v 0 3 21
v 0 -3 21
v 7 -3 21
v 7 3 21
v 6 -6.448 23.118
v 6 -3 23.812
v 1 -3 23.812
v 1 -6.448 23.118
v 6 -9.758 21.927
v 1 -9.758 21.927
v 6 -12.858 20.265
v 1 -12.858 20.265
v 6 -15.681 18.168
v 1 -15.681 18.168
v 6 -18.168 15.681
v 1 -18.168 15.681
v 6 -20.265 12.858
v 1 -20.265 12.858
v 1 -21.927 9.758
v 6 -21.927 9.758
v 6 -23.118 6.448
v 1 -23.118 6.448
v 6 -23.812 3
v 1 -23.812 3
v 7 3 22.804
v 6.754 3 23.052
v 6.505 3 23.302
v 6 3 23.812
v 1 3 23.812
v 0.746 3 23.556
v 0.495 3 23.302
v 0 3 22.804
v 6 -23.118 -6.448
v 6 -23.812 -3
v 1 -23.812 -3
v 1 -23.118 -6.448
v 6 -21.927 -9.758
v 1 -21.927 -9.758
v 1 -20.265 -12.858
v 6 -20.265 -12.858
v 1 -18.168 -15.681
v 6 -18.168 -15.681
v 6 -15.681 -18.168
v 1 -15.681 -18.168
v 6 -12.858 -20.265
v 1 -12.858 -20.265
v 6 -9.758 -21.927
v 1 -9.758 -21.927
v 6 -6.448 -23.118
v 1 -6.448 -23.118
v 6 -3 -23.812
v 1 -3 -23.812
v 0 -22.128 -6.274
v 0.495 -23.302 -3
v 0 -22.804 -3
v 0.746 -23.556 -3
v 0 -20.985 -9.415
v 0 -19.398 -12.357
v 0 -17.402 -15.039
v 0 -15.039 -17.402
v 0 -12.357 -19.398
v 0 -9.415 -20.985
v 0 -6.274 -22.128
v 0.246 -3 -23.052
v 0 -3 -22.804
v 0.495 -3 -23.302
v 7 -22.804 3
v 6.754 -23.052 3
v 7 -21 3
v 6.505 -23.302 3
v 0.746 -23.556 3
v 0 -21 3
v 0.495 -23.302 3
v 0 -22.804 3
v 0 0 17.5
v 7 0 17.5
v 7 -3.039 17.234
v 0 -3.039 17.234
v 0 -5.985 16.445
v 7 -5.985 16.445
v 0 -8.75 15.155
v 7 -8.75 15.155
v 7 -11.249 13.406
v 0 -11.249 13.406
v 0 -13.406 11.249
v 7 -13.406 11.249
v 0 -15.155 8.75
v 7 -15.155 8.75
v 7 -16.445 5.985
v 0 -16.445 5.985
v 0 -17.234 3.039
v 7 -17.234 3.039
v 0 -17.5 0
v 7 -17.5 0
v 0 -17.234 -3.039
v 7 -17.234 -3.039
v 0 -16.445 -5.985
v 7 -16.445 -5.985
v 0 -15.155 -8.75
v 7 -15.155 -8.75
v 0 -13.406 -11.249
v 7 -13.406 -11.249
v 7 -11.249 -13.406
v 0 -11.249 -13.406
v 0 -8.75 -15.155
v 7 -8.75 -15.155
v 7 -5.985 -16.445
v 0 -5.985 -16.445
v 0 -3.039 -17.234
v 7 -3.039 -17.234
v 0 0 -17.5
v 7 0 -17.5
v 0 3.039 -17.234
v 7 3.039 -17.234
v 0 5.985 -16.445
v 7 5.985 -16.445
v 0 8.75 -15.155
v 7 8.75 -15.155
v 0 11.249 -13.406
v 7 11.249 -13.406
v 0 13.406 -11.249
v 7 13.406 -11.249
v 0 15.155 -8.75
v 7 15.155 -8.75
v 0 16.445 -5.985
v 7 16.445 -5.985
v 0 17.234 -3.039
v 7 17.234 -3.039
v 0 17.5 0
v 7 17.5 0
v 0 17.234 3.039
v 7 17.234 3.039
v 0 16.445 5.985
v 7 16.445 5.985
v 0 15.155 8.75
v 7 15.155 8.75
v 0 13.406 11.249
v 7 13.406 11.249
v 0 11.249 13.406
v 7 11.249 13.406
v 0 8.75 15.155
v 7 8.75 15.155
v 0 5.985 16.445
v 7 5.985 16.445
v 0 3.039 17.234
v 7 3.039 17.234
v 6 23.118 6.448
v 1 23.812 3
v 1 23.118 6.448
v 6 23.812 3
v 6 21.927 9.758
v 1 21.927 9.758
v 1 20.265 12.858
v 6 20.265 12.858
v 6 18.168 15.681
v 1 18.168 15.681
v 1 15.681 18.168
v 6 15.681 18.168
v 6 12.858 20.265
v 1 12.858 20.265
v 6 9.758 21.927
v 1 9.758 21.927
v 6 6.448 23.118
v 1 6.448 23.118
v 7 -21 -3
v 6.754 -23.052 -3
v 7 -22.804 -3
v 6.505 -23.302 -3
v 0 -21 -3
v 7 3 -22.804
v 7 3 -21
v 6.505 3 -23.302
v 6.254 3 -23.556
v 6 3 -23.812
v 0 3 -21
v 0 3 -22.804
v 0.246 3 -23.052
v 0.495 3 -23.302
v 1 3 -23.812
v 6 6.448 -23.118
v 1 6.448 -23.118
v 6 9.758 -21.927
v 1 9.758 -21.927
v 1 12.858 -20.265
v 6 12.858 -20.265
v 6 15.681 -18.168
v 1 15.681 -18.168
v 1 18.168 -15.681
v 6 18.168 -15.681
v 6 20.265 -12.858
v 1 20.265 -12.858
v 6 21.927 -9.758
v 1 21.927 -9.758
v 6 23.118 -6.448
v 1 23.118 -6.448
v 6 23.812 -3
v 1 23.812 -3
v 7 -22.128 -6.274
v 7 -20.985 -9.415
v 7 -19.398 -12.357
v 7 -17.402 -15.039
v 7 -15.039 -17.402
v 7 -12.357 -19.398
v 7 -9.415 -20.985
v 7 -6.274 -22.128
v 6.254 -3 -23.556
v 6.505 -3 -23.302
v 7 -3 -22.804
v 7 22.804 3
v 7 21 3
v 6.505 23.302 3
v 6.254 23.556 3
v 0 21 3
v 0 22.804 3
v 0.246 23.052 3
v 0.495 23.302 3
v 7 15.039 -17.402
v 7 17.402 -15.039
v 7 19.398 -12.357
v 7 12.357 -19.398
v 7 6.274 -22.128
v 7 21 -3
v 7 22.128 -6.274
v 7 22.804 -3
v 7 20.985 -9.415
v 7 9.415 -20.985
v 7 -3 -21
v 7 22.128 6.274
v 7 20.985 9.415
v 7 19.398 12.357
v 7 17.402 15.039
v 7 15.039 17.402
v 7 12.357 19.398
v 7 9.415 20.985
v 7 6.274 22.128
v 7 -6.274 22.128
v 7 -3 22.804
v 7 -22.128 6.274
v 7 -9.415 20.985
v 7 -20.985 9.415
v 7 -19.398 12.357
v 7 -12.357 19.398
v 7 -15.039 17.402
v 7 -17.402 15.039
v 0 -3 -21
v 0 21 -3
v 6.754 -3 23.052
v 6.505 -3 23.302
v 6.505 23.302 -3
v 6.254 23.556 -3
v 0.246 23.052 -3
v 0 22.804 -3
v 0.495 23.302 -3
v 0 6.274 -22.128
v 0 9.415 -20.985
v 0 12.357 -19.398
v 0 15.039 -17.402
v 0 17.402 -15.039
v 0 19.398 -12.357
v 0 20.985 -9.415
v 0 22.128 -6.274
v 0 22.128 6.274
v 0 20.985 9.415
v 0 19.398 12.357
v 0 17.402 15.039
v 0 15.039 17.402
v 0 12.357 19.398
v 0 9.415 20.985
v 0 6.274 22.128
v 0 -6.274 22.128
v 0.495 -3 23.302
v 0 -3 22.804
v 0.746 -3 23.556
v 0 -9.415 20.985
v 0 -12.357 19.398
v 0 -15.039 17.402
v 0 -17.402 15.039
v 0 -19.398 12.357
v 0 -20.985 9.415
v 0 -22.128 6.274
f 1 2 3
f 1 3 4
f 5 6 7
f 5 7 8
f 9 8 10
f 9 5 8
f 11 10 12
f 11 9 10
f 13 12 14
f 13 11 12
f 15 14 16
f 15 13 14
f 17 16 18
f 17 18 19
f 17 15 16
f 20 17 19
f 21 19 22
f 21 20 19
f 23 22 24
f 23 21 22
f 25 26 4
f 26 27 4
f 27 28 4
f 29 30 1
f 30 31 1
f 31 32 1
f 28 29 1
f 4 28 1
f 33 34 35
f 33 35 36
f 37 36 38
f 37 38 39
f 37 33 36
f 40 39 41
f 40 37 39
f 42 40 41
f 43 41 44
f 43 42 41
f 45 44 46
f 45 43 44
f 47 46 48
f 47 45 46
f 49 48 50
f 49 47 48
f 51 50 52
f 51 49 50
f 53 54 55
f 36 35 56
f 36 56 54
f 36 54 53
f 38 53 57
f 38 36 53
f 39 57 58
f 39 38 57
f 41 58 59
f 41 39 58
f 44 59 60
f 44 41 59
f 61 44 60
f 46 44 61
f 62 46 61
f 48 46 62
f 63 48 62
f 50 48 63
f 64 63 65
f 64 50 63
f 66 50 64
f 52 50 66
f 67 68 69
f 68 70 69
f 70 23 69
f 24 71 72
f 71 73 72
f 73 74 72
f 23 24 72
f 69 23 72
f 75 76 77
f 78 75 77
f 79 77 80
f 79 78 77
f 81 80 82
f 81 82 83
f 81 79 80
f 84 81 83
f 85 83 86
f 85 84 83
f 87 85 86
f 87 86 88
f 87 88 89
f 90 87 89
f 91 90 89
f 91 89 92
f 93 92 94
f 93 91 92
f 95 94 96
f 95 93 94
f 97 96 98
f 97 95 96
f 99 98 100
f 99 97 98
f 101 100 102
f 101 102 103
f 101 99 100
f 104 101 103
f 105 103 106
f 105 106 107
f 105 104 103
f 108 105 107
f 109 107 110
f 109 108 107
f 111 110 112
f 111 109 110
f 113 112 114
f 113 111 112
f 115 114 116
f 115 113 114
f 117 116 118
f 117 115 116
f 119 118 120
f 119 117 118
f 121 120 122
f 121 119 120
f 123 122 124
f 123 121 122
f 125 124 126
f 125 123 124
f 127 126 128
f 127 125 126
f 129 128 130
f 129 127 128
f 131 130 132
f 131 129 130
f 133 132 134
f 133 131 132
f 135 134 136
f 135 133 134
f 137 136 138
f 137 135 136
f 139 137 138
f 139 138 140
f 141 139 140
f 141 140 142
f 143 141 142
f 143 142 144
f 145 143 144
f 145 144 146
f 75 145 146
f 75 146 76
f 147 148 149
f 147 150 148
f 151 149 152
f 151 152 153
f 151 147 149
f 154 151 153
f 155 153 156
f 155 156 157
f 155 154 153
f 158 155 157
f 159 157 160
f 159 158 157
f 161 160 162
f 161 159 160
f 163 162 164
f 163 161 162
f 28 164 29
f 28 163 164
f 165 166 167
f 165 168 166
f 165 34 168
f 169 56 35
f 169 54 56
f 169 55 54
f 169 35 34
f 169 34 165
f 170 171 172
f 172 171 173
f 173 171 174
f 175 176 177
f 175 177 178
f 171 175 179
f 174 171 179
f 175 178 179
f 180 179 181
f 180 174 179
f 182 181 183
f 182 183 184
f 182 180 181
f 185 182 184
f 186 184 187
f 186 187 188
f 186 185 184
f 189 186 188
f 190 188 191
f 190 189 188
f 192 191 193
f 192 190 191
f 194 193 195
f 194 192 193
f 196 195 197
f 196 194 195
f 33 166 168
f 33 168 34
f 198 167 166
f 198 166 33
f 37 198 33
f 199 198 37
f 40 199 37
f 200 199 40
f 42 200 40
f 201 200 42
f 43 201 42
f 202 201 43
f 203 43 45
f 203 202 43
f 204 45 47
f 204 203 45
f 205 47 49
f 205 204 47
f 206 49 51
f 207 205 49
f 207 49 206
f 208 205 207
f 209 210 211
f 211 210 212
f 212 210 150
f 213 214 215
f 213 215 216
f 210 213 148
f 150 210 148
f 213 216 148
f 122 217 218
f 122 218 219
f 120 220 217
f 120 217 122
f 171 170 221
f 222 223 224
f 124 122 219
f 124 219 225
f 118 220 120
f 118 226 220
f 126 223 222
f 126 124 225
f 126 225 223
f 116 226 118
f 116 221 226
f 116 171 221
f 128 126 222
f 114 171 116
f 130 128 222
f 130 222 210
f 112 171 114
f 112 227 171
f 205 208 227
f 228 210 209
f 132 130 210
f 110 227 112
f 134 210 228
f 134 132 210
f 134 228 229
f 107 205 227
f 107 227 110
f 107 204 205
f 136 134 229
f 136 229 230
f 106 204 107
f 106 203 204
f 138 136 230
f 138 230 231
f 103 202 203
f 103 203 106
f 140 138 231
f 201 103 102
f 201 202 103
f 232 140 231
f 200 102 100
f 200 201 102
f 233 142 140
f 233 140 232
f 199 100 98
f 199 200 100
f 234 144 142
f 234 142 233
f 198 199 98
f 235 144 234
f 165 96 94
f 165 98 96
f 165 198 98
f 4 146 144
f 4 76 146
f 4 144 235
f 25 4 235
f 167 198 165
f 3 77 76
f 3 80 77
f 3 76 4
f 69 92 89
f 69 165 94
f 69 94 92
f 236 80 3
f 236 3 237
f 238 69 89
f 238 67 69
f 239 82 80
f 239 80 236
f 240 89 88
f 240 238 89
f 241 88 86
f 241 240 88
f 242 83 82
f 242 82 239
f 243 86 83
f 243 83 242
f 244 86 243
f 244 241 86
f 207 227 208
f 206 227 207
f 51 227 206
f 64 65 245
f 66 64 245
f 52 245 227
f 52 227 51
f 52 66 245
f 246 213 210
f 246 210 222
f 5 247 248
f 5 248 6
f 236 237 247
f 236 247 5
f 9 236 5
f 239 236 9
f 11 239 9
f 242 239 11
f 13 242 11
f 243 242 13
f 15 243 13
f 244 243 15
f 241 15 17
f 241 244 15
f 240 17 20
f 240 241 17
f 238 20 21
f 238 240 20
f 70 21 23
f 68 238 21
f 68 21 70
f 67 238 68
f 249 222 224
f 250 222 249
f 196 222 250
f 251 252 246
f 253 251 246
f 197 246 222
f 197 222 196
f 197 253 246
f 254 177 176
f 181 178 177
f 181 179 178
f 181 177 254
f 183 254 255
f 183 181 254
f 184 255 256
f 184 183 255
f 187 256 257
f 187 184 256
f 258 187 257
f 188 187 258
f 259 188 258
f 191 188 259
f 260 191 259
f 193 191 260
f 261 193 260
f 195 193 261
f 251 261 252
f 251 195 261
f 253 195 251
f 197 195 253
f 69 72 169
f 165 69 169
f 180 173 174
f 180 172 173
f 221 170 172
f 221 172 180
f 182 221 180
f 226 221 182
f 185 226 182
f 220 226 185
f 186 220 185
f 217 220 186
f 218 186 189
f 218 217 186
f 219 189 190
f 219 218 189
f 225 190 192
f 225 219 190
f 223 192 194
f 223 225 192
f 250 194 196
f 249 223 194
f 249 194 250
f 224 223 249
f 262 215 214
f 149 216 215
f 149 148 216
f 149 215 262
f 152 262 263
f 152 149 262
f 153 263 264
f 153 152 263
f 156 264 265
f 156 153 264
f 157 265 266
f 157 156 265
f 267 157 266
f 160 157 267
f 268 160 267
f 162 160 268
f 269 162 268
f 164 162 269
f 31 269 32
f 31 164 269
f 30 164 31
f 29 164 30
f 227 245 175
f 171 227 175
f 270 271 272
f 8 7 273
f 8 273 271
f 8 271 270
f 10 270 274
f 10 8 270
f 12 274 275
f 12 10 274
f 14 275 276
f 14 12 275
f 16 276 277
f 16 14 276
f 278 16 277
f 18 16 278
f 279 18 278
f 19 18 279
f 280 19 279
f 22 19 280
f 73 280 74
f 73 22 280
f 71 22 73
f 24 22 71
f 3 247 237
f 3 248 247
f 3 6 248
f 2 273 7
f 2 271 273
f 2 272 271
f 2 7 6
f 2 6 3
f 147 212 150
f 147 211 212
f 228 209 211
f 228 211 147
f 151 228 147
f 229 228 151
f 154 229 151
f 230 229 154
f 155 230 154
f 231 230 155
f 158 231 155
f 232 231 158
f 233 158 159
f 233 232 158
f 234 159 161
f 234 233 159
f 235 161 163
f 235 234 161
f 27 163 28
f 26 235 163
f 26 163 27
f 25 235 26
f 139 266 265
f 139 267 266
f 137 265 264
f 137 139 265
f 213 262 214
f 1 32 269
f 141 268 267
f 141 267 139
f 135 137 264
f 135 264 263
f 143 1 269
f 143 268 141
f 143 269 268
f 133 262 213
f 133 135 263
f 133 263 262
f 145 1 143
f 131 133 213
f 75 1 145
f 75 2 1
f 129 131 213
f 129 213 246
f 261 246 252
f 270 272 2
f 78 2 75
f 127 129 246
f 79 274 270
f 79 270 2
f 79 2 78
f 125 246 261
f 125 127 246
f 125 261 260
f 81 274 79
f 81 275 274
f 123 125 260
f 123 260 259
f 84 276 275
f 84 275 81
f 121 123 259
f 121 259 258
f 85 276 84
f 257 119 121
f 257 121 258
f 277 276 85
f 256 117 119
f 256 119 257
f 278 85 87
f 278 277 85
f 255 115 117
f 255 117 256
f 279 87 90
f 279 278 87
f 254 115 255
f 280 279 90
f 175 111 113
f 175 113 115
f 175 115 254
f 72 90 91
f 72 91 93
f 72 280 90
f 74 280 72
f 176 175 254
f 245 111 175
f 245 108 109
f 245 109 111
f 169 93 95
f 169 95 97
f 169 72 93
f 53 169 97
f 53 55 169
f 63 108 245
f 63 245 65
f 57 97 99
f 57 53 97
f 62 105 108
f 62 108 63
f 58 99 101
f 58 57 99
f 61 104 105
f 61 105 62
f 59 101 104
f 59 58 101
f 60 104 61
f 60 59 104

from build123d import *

# Parameters (mm, degrees)
SKETCH_2_W       = 5
SKETCH_2_H       = 6
SKETCH_2_W_2     = 6
SKETCH_2_H_2     = 5
F_02_SLOTS_DEPTH = 8


with BuildPart() as part:
    # 草图1 → 01_RING (revolve)
    with BuildSketch(Plane.XY, mode=Mode.PRIVATE) as f_01_ring_sk:
        Polygon((0, 17.5), (0, 23), (1, 24), (6, 24), (7, 23), (7, 17.5), align=None)
    revolve(f_01_ring_sk.sketch.rotate(Axis((-5, 0, 0), (1, 0, 0)), 90), axis=Axis((-5, 0, 0), (1, 0, 0)))

    # 草图2 → 02_SLOTS (cut)
    with BuildSketch(Plane(origin=(-0.5, 0, 0), x_dir=(0, 0, -1), z_dir=(1, 0, 0))):
        with Locations((23.5, 0)):
            Rectangle(SKETCH_2_W, SKETCH_2_H)
        with Locations((-23.5, 0)):
            Rectangle(SKETCH_2_W, SKETCH_2_H)
        with Locations((0, 23.5)):
            Rectangle(SKETCH_2_W_2, SKETCH_2_H_2)
        with Locations((0, -23.5)):
            Rectangle(SKETCH_2_W_2, SKETCH_2_H_2)
    extrude(amount=F_02_SLOTS_DEPTH, mode=Mode.SUBTRACT)


solid = part.part
